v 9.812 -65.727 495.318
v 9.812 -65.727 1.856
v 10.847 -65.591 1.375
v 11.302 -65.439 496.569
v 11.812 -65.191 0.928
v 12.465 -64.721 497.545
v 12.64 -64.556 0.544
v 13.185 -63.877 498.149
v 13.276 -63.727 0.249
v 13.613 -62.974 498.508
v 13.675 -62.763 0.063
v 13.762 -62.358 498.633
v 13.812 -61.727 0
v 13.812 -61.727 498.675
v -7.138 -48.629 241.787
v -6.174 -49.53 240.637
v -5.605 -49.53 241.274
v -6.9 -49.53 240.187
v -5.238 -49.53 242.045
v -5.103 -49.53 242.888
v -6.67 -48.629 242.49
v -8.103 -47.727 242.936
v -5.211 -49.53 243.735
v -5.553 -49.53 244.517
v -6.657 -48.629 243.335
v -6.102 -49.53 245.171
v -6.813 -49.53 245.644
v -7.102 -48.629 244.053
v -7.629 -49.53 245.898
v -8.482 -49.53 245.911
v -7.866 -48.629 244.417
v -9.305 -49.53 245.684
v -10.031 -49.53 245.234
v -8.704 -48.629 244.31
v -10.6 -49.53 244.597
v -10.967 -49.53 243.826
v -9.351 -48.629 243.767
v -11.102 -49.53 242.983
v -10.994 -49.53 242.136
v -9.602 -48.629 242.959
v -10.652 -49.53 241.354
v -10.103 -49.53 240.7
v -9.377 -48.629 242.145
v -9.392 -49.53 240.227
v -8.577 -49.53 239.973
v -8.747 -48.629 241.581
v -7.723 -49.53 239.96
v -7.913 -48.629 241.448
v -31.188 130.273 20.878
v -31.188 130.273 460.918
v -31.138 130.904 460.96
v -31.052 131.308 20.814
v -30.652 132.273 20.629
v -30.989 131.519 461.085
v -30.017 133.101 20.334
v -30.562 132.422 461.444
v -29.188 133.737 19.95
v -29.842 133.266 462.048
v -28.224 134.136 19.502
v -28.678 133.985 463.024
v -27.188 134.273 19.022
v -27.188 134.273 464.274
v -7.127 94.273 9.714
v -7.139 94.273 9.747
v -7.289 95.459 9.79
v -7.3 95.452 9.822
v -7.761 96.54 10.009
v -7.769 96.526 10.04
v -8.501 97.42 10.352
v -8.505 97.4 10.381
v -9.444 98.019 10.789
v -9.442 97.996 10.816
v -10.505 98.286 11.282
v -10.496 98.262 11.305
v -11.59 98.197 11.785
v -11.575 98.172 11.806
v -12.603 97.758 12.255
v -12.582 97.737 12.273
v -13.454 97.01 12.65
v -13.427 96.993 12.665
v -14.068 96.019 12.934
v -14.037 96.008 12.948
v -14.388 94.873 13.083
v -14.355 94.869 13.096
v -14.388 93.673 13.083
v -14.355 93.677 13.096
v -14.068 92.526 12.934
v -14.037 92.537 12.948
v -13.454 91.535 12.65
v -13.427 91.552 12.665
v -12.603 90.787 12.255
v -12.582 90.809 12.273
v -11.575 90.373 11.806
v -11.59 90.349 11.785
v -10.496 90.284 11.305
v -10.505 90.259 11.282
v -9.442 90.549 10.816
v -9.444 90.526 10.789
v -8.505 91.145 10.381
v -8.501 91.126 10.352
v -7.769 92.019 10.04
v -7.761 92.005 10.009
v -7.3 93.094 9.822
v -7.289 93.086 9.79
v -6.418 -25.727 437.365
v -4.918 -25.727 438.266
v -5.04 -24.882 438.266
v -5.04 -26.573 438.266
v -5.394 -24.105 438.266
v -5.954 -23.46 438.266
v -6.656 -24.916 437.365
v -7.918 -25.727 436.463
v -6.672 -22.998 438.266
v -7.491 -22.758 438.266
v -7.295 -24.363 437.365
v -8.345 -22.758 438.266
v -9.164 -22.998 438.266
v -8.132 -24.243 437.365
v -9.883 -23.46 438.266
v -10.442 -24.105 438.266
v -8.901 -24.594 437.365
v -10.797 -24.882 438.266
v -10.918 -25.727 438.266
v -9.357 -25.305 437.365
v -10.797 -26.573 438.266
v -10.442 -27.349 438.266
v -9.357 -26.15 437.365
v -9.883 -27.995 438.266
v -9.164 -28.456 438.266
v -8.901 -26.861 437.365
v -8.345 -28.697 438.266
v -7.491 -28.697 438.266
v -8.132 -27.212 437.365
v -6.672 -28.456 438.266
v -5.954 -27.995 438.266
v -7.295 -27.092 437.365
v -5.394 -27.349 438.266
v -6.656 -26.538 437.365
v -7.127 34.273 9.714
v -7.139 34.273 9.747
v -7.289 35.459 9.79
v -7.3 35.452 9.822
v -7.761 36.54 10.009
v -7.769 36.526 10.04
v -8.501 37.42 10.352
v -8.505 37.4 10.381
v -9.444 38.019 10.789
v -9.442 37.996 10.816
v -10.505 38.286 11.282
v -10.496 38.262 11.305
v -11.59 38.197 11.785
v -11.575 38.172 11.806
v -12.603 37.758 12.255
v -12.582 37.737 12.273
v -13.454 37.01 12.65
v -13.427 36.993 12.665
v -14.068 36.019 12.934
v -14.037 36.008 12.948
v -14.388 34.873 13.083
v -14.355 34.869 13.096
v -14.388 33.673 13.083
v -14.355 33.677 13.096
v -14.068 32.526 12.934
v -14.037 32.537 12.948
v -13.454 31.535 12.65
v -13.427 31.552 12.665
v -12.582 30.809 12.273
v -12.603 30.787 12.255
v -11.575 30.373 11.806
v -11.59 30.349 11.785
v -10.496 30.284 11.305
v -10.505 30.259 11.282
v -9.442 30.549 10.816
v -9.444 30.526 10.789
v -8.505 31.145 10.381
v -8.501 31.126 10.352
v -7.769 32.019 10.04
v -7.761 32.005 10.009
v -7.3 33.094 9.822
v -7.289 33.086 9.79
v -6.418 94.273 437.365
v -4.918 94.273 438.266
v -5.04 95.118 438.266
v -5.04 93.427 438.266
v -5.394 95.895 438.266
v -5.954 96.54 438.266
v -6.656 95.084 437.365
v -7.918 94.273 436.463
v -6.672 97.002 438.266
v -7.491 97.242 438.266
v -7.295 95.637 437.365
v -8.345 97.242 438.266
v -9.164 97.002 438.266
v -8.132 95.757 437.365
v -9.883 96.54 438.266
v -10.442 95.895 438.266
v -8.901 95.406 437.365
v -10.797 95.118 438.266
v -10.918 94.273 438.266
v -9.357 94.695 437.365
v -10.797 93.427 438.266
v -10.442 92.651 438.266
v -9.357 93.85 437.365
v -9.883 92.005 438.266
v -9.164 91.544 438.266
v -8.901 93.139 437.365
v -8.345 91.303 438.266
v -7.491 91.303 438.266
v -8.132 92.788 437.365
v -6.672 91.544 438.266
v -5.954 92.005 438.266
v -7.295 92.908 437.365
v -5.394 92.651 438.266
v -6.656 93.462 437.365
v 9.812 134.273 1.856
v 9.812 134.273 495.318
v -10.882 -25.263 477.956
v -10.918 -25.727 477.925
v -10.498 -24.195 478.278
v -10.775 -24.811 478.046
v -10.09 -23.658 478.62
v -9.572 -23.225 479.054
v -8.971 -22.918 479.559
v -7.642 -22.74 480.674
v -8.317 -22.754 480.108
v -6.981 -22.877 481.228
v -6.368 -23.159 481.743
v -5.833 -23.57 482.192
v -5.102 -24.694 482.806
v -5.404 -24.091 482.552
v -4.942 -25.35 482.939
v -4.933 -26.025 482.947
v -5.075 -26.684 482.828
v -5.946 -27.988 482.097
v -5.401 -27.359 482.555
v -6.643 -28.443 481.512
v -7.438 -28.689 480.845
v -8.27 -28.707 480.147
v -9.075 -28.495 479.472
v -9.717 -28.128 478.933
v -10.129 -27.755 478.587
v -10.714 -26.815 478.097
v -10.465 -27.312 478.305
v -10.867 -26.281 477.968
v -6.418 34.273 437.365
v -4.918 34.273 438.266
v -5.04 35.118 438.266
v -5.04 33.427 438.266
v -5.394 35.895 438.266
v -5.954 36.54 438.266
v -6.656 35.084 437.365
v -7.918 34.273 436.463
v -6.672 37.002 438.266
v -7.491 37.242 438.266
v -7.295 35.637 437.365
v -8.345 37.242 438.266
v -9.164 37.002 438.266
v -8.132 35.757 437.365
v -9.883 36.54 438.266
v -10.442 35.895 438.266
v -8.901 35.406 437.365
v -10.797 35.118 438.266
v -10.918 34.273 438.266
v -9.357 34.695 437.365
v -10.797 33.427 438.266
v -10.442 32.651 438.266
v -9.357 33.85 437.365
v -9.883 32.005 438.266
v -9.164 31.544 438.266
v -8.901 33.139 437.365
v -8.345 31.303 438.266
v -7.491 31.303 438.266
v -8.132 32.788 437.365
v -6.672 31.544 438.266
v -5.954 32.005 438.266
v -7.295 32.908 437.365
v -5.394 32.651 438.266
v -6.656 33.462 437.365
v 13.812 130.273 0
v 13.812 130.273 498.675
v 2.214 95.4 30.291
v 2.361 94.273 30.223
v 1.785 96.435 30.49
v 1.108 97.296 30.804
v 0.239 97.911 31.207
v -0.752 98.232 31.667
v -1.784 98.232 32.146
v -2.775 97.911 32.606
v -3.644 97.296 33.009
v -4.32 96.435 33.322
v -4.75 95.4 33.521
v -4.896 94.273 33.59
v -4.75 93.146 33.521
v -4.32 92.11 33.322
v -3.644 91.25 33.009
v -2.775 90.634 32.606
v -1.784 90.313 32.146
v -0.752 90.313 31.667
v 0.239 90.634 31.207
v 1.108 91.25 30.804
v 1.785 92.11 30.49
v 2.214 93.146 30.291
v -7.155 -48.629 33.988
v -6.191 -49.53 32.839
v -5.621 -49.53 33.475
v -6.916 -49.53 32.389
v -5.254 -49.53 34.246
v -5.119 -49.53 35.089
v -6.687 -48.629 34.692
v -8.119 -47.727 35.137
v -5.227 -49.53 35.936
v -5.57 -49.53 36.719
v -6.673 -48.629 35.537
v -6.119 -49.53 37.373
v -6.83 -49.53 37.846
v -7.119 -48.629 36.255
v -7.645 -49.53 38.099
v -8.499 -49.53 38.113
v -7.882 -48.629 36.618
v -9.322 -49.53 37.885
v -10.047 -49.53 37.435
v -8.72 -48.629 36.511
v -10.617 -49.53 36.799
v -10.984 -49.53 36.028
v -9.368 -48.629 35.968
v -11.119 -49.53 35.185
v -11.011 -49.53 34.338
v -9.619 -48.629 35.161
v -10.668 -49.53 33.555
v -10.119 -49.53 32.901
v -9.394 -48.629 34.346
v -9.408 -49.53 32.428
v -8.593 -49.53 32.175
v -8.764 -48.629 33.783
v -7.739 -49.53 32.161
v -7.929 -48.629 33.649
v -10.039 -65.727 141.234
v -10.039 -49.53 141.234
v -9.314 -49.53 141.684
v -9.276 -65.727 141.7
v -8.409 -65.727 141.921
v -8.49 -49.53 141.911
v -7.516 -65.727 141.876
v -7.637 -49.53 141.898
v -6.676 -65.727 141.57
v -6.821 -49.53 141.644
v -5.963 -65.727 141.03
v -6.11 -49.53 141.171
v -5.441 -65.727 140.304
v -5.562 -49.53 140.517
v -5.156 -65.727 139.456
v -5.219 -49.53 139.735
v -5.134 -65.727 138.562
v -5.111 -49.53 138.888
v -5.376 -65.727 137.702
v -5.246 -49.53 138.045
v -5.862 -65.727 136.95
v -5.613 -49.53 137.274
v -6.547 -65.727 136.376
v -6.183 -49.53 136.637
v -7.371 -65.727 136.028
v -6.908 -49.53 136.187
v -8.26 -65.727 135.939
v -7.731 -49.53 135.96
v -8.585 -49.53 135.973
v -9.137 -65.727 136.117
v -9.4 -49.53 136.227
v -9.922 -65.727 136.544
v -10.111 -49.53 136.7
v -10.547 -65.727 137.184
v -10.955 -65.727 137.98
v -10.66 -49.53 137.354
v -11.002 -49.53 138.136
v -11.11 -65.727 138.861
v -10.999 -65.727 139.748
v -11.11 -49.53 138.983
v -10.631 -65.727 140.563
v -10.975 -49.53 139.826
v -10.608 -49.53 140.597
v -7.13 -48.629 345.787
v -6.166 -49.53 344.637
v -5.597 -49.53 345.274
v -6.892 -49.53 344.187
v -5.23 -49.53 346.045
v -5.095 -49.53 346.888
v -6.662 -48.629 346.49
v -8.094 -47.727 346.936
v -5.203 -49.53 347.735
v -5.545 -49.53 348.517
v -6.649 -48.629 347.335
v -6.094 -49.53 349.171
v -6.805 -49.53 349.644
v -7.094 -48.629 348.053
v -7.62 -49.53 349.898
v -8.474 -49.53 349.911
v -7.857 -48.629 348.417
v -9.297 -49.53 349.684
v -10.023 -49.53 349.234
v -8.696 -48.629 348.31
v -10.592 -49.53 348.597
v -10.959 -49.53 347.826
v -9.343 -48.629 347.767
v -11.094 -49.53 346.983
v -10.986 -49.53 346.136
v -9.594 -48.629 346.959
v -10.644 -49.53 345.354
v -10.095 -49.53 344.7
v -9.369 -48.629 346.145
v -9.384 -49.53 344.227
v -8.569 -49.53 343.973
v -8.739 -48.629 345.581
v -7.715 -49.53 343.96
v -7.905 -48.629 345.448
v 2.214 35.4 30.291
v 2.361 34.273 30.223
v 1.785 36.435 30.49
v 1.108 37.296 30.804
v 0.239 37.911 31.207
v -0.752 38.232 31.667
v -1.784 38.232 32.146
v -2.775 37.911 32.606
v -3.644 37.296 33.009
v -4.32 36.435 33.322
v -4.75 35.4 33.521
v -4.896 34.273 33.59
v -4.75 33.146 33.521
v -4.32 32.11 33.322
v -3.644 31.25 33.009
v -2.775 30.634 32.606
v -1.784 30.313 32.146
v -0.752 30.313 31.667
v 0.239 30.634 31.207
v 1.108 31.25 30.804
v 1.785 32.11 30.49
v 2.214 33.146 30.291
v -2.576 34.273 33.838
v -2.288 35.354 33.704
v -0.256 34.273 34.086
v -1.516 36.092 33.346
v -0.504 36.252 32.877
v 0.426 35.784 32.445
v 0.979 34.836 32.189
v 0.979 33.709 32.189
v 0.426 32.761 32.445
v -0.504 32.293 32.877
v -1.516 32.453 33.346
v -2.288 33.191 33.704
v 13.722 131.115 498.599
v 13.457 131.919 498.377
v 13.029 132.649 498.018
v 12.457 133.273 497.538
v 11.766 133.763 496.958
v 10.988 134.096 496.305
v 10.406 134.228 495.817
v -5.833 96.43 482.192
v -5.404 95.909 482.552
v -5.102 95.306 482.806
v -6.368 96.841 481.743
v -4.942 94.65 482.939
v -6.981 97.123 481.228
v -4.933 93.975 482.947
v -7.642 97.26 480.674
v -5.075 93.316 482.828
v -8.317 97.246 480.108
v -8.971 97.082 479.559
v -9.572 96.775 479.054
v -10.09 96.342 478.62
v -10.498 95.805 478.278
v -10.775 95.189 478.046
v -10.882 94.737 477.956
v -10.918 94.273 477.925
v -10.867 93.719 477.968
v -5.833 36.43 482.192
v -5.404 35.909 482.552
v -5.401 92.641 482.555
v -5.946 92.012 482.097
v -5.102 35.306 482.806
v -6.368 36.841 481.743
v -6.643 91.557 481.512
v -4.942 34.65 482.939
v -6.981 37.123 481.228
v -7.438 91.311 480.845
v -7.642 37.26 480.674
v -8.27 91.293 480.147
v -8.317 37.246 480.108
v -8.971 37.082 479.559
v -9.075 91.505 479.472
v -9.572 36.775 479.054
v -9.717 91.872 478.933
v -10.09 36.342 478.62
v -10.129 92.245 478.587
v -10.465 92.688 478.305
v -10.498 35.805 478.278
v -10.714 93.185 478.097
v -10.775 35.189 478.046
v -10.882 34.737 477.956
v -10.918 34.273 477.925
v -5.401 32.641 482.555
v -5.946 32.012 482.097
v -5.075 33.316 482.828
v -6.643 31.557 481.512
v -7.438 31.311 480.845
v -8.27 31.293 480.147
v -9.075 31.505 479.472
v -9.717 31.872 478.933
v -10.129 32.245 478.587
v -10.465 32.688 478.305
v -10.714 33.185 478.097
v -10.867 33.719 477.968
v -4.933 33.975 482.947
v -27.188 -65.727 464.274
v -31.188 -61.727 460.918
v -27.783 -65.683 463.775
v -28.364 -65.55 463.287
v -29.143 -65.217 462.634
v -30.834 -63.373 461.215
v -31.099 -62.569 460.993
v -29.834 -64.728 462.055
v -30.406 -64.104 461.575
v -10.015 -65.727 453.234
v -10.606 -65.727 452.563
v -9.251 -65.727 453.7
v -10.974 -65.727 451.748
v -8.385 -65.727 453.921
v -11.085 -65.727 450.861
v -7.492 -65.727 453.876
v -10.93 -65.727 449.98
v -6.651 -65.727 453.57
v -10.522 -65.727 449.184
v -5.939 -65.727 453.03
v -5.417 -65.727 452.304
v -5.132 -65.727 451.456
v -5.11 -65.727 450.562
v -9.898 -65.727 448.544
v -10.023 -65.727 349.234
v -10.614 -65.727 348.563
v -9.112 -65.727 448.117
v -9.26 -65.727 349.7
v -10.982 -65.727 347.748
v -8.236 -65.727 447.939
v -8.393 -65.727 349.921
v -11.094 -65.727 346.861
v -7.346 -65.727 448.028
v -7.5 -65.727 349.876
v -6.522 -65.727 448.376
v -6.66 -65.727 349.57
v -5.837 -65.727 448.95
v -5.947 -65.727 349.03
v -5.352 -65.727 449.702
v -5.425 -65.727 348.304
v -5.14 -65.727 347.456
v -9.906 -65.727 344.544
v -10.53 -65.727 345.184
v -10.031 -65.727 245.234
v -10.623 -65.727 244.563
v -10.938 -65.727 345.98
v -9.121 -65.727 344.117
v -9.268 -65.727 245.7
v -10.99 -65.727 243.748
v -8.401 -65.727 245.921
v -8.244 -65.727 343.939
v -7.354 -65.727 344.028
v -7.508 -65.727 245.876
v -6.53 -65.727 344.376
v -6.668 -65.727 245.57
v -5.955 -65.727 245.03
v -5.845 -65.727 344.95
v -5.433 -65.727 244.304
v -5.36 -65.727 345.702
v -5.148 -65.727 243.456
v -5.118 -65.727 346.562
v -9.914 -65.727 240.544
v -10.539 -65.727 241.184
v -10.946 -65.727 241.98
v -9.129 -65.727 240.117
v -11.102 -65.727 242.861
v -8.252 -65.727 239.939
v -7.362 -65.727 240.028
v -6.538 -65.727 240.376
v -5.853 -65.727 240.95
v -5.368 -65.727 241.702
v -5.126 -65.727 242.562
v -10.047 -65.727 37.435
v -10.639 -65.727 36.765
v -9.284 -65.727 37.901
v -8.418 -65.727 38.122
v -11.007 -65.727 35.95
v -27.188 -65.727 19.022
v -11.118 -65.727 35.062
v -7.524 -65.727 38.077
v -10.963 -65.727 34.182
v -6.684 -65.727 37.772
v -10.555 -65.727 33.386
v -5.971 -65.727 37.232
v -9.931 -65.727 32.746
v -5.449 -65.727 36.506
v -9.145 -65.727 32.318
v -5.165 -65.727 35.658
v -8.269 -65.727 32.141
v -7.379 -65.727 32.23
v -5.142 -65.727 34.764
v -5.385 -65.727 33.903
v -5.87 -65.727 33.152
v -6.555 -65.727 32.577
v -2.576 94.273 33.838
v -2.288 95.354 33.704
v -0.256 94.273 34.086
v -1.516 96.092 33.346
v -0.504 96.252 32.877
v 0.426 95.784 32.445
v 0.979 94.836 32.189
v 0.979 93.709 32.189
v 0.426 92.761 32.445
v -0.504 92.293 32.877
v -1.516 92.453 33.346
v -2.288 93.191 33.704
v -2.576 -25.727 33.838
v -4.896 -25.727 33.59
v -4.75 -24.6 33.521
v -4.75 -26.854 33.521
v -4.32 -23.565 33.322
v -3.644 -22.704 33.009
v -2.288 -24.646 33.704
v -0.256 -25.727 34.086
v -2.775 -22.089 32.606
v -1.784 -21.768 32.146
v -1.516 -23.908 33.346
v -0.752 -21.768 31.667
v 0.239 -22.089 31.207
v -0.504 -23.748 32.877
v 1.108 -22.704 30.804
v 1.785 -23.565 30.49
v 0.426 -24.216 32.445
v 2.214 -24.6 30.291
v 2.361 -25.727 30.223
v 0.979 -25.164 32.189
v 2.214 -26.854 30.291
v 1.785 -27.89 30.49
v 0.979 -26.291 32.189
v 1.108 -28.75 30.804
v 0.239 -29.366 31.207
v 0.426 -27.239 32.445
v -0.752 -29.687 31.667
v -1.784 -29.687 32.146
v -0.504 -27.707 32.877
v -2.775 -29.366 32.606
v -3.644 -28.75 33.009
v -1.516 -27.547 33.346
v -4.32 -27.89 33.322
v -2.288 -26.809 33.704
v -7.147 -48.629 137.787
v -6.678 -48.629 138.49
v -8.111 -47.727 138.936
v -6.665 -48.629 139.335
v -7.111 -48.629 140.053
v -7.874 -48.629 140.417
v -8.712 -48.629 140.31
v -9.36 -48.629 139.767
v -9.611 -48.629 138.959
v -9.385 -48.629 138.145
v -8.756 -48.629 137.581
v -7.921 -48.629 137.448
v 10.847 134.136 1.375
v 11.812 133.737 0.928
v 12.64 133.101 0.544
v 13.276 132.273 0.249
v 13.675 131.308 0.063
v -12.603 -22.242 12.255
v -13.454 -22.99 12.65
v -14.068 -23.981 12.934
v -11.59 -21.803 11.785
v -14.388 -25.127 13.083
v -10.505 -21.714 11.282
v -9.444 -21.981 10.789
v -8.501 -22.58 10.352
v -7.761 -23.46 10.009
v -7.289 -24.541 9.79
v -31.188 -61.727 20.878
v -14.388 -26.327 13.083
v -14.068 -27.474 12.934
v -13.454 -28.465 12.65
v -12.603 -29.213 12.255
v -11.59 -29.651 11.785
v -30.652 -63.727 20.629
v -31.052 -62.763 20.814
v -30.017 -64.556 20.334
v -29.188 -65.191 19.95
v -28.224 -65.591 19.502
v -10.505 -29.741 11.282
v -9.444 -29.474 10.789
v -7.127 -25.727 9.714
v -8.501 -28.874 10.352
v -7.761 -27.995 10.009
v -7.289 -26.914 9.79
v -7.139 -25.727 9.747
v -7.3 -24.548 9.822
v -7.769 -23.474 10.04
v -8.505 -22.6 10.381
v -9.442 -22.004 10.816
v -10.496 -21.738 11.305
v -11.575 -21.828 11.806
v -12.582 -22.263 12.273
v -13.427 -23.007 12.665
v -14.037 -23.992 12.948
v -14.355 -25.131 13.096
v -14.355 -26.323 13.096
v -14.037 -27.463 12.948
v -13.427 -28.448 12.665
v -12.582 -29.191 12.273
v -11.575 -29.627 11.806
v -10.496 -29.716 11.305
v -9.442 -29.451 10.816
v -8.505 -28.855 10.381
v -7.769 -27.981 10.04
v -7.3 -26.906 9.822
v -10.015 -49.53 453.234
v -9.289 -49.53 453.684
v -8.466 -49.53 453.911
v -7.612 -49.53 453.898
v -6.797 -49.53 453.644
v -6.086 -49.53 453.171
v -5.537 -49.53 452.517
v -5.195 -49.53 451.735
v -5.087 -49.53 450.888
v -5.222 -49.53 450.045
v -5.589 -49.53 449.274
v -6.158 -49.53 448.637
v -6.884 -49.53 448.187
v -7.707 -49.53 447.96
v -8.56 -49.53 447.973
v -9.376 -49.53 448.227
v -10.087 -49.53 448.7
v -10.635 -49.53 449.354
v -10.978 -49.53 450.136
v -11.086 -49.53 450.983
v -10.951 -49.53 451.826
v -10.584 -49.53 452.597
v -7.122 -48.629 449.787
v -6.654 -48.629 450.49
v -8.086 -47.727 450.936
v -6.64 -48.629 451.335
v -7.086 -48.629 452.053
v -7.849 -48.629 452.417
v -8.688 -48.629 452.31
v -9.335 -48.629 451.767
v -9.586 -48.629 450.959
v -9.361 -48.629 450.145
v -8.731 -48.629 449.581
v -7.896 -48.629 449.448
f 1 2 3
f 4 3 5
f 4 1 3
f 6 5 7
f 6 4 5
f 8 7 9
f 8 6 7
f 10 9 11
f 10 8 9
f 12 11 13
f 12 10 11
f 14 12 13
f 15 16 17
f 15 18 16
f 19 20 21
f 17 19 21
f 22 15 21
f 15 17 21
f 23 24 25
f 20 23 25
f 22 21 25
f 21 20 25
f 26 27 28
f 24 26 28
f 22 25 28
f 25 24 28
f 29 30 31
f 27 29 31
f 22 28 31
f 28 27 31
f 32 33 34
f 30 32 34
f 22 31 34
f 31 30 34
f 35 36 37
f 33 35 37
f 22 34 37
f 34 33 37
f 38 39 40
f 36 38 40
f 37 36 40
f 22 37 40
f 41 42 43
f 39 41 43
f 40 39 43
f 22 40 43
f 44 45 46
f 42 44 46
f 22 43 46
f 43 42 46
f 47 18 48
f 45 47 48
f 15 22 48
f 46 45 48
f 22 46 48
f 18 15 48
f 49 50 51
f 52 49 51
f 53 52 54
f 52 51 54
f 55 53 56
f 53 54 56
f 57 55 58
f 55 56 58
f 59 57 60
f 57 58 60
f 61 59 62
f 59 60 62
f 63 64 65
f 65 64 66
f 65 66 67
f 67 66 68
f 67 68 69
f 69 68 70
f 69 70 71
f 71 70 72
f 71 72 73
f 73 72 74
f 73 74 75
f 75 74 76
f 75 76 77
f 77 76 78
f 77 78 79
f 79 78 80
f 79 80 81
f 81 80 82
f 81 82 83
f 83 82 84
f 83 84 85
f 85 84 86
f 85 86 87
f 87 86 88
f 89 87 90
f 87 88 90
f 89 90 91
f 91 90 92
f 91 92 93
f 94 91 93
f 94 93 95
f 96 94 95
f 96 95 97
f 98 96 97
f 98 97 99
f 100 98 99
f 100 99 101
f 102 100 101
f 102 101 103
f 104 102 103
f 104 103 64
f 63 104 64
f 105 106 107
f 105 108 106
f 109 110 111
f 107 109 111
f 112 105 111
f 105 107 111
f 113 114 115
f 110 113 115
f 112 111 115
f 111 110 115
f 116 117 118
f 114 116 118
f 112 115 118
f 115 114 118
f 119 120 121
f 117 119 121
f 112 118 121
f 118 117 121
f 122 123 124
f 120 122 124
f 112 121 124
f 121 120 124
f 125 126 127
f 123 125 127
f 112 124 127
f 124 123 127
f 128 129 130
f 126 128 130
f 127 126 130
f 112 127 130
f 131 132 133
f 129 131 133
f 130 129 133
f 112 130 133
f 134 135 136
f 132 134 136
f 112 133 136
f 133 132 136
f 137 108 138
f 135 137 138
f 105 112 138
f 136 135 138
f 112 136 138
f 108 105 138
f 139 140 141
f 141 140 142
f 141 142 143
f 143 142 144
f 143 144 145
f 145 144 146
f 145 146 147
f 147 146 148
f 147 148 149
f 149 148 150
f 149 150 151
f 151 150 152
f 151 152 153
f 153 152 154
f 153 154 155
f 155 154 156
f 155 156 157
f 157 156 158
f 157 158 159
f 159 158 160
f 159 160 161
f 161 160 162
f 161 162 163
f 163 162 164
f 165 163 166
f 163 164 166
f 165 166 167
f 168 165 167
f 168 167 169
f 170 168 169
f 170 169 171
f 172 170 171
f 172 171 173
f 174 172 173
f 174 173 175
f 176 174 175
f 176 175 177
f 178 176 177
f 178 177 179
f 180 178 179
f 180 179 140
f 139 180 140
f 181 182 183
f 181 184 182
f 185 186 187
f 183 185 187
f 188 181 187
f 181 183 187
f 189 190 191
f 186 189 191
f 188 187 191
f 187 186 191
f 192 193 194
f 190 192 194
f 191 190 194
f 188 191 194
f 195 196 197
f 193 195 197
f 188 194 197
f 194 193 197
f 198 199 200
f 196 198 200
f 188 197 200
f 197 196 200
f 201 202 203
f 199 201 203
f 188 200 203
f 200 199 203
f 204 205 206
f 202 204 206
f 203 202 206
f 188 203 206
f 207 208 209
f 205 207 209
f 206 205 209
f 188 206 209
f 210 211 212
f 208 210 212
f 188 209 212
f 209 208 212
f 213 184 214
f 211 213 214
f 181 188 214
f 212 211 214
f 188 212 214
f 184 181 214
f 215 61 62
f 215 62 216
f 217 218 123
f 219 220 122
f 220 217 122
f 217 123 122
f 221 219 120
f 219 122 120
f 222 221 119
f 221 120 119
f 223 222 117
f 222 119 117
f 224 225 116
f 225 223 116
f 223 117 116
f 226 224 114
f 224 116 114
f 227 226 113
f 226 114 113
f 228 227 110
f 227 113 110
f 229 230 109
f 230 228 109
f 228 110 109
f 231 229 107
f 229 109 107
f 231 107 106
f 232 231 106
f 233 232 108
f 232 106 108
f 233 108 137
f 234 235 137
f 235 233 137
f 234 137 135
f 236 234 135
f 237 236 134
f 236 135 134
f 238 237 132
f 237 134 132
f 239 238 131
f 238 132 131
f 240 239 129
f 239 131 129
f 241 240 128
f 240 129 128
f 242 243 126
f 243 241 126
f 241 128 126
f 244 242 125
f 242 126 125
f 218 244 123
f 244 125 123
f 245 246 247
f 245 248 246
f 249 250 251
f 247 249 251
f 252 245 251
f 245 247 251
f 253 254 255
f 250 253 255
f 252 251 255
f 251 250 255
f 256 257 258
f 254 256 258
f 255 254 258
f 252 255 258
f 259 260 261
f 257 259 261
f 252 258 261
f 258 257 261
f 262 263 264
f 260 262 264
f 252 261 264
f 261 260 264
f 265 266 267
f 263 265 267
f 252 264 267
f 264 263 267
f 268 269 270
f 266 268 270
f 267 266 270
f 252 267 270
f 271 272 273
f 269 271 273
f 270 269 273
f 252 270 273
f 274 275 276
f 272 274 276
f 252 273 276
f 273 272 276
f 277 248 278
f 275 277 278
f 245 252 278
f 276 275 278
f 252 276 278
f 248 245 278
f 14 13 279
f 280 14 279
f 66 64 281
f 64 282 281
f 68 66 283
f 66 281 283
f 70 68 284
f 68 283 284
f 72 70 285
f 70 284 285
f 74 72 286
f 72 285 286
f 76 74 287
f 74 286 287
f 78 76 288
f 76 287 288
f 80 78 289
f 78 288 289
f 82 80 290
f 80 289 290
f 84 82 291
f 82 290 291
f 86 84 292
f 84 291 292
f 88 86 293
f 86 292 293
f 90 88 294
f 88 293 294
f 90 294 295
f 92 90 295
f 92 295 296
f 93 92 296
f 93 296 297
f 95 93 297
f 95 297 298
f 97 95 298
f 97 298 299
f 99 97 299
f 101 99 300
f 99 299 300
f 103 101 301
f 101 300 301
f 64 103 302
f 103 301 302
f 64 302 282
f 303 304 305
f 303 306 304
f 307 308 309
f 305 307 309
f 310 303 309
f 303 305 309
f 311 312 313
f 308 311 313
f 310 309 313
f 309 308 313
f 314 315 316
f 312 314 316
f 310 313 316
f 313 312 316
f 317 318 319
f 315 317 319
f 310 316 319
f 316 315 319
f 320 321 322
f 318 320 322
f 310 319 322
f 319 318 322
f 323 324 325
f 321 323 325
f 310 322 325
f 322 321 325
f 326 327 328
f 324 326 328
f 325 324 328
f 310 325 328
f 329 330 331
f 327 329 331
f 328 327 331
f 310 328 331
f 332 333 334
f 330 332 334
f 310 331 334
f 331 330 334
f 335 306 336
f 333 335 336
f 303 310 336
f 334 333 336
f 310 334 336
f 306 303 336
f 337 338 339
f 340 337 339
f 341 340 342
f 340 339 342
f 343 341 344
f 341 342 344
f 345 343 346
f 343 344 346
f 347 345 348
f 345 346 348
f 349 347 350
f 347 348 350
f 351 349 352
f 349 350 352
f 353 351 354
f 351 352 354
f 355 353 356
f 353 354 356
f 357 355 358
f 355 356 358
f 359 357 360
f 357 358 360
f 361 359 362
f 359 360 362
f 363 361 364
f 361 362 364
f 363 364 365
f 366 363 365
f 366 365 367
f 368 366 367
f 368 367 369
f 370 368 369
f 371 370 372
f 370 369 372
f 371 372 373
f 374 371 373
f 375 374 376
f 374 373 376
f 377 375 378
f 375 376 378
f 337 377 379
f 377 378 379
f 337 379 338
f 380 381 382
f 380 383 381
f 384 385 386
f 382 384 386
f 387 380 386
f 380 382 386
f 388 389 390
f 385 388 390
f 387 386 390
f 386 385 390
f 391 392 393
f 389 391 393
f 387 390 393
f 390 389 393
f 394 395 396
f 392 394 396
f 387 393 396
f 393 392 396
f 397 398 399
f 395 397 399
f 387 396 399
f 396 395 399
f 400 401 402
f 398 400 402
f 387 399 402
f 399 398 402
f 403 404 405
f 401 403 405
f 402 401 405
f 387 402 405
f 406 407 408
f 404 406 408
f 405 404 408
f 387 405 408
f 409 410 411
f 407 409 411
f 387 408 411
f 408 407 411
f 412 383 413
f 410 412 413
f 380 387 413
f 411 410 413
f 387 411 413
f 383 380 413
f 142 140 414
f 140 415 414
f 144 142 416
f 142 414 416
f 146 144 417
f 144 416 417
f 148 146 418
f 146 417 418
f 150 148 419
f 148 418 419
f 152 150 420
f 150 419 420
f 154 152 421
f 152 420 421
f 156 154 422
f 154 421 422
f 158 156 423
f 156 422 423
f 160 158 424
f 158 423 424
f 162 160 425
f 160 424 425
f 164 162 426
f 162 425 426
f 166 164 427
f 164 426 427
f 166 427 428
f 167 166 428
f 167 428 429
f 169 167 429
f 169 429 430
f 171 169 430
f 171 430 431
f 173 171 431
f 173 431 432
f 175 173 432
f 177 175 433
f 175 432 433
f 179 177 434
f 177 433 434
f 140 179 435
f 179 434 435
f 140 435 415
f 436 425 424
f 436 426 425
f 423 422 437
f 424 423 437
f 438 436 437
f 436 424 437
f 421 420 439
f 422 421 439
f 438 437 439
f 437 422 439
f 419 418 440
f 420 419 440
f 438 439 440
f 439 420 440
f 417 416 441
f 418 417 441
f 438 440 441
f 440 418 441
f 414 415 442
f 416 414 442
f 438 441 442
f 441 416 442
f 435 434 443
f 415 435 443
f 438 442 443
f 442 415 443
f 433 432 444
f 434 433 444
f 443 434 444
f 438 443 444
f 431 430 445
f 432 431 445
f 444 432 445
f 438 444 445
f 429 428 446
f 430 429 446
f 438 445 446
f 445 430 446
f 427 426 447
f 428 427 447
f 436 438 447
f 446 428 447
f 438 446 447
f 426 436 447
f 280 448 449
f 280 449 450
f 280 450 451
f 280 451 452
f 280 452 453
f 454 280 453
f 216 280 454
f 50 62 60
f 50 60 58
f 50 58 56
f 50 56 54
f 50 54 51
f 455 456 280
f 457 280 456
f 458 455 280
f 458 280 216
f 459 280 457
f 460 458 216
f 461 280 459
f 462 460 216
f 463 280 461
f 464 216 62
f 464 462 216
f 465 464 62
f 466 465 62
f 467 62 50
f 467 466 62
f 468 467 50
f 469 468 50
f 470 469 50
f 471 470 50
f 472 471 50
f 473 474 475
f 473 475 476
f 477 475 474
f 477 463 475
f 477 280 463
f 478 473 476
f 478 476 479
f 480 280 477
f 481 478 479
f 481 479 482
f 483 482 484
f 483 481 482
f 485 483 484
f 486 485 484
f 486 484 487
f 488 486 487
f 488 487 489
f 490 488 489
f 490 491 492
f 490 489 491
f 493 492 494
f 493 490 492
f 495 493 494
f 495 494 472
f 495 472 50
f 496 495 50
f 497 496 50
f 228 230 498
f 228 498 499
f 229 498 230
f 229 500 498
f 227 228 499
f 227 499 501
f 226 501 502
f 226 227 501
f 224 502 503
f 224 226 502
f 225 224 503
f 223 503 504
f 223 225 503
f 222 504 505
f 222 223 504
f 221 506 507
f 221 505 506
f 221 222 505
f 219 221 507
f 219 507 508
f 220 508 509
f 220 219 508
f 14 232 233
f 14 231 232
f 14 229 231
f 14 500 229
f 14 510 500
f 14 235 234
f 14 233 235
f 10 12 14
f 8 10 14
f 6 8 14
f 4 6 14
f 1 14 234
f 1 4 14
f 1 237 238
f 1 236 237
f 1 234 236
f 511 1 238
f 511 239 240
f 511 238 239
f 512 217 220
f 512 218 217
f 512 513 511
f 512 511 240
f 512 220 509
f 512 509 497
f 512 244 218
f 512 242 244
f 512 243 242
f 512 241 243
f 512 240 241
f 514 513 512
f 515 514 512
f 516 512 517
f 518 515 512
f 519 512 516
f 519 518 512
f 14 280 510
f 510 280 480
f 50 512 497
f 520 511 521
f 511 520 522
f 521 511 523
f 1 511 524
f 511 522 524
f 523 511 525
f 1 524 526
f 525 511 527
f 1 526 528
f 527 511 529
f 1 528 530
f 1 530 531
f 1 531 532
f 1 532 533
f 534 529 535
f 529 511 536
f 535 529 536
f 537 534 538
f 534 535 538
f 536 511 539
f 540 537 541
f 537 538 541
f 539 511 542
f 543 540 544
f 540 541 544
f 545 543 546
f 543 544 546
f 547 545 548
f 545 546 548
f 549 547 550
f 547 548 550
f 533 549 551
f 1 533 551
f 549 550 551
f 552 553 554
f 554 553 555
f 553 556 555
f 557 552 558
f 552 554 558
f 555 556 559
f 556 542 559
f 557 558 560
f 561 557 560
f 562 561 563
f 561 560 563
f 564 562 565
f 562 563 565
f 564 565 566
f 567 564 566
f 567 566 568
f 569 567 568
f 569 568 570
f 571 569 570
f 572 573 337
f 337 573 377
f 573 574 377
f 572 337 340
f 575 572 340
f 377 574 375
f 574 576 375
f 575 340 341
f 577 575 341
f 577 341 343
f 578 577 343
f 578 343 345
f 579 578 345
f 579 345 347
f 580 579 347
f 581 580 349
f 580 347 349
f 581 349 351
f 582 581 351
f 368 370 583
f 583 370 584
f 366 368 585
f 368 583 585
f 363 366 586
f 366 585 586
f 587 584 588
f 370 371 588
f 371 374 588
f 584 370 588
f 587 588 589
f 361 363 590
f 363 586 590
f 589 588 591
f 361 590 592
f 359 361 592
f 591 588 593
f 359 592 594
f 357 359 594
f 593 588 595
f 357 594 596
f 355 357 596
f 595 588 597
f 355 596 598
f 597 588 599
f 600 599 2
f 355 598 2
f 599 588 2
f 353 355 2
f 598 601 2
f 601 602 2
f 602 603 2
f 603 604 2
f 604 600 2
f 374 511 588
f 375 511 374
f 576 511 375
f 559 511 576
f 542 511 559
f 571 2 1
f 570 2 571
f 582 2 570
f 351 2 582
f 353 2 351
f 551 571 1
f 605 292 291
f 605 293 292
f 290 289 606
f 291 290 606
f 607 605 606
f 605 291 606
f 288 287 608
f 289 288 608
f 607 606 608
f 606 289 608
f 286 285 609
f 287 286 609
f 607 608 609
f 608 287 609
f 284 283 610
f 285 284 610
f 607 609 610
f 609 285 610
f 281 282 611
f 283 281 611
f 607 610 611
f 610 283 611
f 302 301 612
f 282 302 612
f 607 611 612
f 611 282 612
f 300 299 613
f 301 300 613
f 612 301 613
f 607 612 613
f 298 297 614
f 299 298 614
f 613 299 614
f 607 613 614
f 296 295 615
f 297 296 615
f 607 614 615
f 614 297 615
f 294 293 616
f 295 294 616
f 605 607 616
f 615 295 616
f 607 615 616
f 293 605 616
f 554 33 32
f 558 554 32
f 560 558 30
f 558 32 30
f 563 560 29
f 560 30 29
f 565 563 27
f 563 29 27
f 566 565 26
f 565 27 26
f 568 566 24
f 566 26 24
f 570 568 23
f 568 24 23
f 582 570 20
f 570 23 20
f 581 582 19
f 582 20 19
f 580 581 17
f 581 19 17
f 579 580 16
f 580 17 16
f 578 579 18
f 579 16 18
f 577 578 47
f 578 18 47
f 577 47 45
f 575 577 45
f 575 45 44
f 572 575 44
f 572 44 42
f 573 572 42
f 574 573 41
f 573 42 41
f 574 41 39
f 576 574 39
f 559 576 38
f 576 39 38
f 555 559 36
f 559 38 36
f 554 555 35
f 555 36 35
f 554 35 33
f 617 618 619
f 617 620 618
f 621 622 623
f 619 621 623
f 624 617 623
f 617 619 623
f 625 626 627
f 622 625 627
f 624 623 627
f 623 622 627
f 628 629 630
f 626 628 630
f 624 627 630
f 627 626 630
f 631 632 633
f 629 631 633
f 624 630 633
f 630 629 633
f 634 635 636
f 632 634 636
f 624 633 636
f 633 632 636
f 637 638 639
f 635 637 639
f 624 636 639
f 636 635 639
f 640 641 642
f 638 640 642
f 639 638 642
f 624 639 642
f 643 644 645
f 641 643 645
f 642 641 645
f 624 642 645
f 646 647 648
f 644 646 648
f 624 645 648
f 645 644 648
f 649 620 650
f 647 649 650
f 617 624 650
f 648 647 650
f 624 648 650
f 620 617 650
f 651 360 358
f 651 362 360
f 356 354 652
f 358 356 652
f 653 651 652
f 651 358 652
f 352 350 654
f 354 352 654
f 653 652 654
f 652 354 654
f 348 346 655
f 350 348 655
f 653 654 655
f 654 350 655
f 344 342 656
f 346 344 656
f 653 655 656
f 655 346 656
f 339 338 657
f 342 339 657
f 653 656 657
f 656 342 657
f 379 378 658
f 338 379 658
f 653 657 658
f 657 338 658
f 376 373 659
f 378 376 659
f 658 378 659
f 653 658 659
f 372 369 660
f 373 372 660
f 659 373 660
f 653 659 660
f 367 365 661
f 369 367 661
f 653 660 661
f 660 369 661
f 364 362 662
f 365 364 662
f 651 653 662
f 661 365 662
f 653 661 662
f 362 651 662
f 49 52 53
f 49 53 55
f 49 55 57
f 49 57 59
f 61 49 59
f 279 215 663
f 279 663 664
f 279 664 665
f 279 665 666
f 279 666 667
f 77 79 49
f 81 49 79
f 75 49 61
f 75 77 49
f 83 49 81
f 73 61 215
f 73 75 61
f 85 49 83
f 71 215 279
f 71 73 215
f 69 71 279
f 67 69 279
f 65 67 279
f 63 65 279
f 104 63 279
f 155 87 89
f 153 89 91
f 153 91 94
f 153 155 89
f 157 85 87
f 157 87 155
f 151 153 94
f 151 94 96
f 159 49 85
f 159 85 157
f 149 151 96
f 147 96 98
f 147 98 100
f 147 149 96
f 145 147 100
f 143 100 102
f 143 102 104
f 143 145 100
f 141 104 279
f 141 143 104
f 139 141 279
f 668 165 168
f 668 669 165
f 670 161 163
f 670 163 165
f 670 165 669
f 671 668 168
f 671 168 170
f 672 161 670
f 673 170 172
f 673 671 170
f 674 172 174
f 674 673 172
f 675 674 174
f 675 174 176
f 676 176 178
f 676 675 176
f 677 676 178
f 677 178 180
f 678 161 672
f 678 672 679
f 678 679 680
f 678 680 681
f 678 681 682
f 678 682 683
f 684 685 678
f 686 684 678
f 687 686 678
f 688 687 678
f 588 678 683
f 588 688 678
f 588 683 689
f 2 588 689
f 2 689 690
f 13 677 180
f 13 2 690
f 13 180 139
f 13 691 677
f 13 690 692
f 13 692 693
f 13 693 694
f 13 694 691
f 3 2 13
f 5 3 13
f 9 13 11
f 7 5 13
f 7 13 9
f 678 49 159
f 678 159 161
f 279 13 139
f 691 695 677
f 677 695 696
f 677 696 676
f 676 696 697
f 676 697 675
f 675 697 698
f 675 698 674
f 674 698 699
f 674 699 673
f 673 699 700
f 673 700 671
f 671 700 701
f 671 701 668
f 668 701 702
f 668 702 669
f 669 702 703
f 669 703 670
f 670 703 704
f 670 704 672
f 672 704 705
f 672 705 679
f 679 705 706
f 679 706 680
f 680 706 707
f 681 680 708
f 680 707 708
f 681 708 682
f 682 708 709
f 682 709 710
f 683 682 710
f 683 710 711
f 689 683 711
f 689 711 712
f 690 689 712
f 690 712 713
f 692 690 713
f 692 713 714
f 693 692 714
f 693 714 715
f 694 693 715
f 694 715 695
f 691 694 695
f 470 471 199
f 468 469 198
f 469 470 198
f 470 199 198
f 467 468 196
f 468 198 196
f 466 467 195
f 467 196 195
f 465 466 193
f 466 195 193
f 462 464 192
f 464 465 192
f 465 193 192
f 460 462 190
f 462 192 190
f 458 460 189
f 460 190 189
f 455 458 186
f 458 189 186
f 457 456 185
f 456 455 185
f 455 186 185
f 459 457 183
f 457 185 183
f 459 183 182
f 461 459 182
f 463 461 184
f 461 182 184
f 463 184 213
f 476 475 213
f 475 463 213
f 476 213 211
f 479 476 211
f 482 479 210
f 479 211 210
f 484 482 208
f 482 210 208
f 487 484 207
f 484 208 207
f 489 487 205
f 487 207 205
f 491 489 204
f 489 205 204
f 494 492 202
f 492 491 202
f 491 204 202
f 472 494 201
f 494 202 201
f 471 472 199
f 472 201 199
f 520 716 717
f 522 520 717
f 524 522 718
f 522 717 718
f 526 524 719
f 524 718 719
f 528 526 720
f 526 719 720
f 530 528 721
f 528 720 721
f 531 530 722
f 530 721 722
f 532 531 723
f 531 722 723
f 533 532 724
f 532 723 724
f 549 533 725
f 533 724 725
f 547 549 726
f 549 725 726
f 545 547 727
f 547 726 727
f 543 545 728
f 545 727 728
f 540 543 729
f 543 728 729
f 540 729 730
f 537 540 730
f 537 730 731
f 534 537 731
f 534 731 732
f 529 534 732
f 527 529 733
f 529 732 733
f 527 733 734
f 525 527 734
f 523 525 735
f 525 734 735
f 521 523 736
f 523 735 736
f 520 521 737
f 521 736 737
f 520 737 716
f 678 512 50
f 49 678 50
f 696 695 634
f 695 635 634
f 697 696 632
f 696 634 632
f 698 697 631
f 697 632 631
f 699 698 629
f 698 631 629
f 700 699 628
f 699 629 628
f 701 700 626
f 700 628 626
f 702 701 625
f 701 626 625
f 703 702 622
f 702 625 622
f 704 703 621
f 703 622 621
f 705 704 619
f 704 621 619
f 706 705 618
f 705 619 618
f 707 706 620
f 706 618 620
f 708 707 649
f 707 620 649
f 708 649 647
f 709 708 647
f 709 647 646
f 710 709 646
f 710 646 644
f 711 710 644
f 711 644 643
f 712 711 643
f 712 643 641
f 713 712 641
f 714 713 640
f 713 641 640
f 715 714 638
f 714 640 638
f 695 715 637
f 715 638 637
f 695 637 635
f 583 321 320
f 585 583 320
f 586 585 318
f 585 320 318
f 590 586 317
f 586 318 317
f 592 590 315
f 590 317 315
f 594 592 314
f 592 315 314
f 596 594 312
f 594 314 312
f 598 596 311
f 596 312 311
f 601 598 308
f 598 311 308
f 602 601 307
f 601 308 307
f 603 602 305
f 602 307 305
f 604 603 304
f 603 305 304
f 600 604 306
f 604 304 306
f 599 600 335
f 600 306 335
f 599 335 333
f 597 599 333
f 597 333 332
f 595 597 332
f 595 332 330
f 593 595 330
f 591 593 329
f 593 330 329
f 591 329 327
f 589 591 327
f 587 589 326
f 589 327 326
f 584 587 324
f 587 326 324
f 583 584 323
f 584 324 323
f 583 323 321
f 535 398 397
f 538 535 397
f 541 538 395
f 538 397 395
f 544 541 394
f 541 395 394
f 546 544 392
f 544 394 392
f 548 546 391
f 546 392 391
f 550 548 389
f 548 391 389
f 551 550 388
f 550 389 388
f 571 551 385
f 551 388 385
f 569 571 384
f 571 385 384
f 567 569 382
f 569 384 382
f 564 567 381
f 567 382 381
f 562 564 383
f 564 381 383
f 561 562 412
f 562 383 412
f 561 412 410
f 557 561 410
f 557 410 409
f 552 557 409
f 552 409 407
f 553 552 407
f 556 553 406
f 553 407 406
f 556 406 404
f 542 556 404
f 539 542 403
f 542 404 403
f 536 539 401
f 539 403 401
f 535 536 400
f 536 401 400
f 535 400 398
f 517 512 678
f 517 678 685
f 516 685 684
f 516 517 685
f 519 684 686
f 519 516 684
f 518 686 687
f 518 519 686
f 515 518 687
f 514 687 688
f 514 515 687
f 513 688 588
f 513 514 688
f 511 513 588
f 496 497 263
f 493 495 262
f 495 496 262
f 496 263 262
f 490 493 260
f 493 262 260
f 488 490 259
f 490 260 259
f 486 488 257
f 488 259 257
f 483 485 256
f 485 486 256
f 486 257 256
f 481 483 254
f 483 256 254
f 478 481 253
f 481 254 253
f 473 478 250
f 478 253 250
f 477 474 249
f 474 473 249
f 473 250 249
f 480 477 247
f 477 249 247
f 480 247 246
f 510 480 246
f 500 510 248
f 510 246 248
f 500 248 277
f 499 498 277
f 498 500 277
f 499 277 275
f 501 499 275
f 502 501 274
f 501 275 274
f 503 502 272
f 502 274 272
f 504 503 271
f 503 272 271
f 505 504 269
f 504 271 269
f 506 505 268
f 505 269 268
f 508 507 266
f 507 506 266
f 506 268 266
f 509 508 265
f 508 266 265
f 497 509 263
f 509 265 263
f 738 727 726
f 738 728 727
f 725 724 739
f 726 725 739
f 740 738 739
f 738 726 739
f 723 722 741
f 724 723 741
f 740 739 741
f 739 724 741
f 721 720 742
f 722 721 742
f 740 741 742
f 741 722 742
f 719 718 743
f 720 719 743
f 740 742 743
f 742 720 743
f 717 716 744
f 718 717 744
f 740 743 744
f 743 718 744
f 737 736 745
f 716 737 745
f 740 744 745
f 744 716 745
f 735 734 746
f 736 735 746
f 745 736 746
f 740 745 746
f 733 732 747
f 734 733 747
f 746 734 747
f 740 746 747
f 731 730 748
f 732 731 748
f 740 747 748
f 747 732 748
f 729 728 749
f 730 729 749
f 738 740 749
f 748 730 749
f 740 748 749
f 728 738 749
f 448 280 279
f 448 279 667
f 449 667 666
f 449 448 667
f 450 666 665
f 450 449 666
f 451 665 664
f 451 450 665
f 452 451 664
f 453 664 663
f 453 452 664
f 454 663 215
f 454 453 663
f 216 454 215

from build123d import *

# Parameters (mm, degrees)
SKETCH1_W                        = 45
SKETCH1_H                        = 200
BOSS_EXTRUDE1_DEPTH              = 510
FILLET1_R                        = 4
CUT_EXTRUDE1_DEPTH               = 549.700926986
CUT_EXTRUDE1_DEPTH_BACK          = 549.700926986
CUT_EXTRUDE2_DEPTH               = 539.19055733
CUT_EXTRUDE2_DEPTH_BACK          = 539.19055733
F_8_0MM_DOWEL_SLOT1_D            = 8
F_8_0MM_DOWEL_SLOT1_DEPTH        = 22.596557524
F_8_0MM_DOWEL_SLOT1_CSINK_D      = 8.05
F_8_0MM_DOWEL_SLOT1_CSINK_ANGLE  = 90
F_8_0MM_DOWEL_SLOT1_TIP          = 2.403442476
F_6_0MM_DOWEL_SLOT_D             = 6
F_6_0MM_DOWEL_SLOT_DEPTH         = 128.197418143
F_6_0MM_DOWEL_SLOT_CSINK_D       = 6.05
F_6_0MM_DOWEL_SLOT_CSINK_ANGLE   = 90
F_6_0MM_DOWEL_SLOT_TIP           = 1.802581857
F_6_0MM_DOWEL_SLOT4_D            = 6
F_6_0MM_DOWEL_SLOT4_DEPTH        = 10.197418143
F_6_0MM_DOWEL_SLOT4_TIP          = 1.802581857
F_6_0MM_DOWEL_SLOT17_D           = 6
F_6_0MM_DOWEL_SLOT17_DEPTH       = 28.197418143
F_6_0MM_DOWEL_SLOT17_CSINK_D     = 6.05
F_6_0MM_DOWEL_SLOT17_CSINK_ANGLE = 90
F_6_0MM_DOWEL_SLOT17_TIP         = 1.802581857


with BuildPart() as part:
    # Sketch1 → Boss-Extrude1 (new body)
    with BuildSketch(Plane.XY):
        with Locations((-8.688255411, 34.272684877)):
            Rectangle(SKETCH1_W, SKETCH1_H)
    extrude(amount=BOSS_EXTRUDE1_DEPTH)

    # Fillet1
    fillet1_edges = [part.edges().sort_by_distance(p)[0] for p in [
        (13.811744589, 134.272684877, 255),
        (13.811744589, -65.727315123, 255),
        (-31.188255411, -65.727315123, 255),
        (-31.188255411, 134.272684877, 255),
    ]]
    fillet(fillet1_edges, radius=FILLET1_R)

    # Sketch2 → Cut-Extrude1 (cut, two sides: drawn at the far end of the back side and taken through both)
    with BuildSketch(Plane(origin=(0, 134.272684877, 0), x_dir=(1, 0, 0), z_dir=(0, 1, 0)).offset(-CUT_EXTRUDE1_DEPTH_BACK)):
        Polygon((788.614470133, -1148.76248804), (13.811744589, -498.67461207), (-31.188255411, -460.917963243), (-805.990980955, 189.169912727), (-2106.166732895, -1360.435538361), (-511.561281807, -2698.367939128), align=None)
    extrude(amount=CUT_EXTRUDE1_DEPTH + CUT_EXTRUDE1_DEPTH_BACK, mode=Mode.SUBTRACT)

    # Sketch3 → Cut-Extrude2 (cut, two sides: drawn at the far end of the back side and taken through both)
    with BuildSketch(Plane(origin=(0, 134.272684877, 0), x_dir=(1, 0, 0), z_dir=(0, 1, 0)).offset(-CUT_EXTRUDE2_DEPTH_BACK)):
        Polygon((-948.658060529, -446.533100004), (-31.188255411, -20.877527163), (13.811744589, 0), (931.281549707, 425.655572841), (79.970404025, 2260.595183077), (-1799.969206211, 1388.406510232), align=None)
    extrude(amount=CUT_EXTRUDE2_DEPTH + CUT_EXTRUDE2_DEPTH_BACK, mode=Mode.SUBTRACT)

    # Ø8.0mm Dowel Slot1
    with Locations(Plane(origin=(-1225.746798414, -65.727315123, 575.087047823), x_dir=(-0.9071269657115731, 0, 0.4208570637151221), z_dir=(-0.4208570637151221, 0, -0.9071269657115731))):
        with Locations((-1339.359258027, 40), (-1339.359258027, 100), (-1339.359258027, 160)):
            CounterSinkHole(F_8_0MM_DOWEL_SLOT1_D / 2, F_8_0MM_DOWEL_SLOT1_CSINK_D / 2, depth=F_8_0MM_DOWEL_SLOT1_DEPTH, counter_sink_angle=F_8_0MM_DOWEL_SLOT1_CSINK_ANGLE)
            with Locations((0, 0, -(F_8_0MM_DOWEL_SLOT1_DEPTH + F_8_0MM_DOWEL_SLOT1_TIP / 2))):  # 118° drill point
                Cone(0, F_8_0MM_DOWEL_SLOT1_D / 2, F_8_0MM_DOWEL_SLOT1_TIP, mode=Mode.SUBTRACT)

    # Ø6.0mm Dowel Slot
    with Locations(Plane(origin=(-1255.768167205, -65.727315123, 566.463420302), x_dir=(1, 0, 0), z_dir=(0, 0, 1))):
        with Locations((1247.849951753, 160), (1247.849951753, 100), (1247.849951753, 40)):
            CounterSinkHole(F_6_0MM_DOWEL_SLOT_D / 2, F_6_0MM_DOWEL_SLOT_CSINK_D / 2, depth=F_6_0MM_DOWEL_SLOT_DEPTH, counter_sink_angle=F_6_0MM_DOWEL_SLOT_CSINK_ANGLE)
            with Locations((0, 0, -(F_6_0MM_DOWEL_SLOT_DEPTH + F_6_0MM_DOWEL_SLOT_TIP / 2))):  # 118° drill point
                Cone(0, F_6_0MM_DOWEL_SLOT_D / 2, F_6_0MM_DOWEL_SLOT_TIP, mode=Mode.SUBTRACT)

    # Ø6.0mm Dowel Slot4
    with Locations(Plane(origin=(-1324.714305528, -77.727315123, 452.529822169), x_dir=(0.642759292005894, 0, -0.766068203582476), z_dir=(0, -1, 0))):
        with Locations((-341.005231297, 740.318686522), (-261.339405676, 807.171930483), (-181.750714685, 873.960445306), (-102.007754434, 940.878418405), (-22.496198074, 1007.60220409), (847.496198074, 1007.60220409), (927.007754434, 940.878418405), (1006.750714685, 873.960445306), (1086.339405676, 807.171930483), (1166.005231297, 740.318686522)):
            Hole(F_6_0MM_DOWEL_SLOT4_D / 2, depth=F_6_0MM_DOWEL_SLOT4_DEPTH)
            with Locations((0, 0, -(F_6_0MM_DOWEL_SLOT4_DEPTH + F_6_0MM_DOWEL_SLOT4_TIP / 2))):  # 118° drill point
                Cone(0, F_6_0MM_DOWEL_SLOT4_D / 2, F_6_0MM_DOWEL_SLOT4_TIP, mode=Mode.SUBTRACT)

    # Ø6.0mm Dowel Slot17
    with Locations(Plane(origin=(-1324.714305529, -77.727315123, 452.529822169), x_dir=(0.642759292005894, 0, -0.766068203582476), z_dir=(0, -1, 0))):
        with Locations((22.5, 1726.5), (22.5, 1640.5), (802.5, 1726.5), (802.5, 1640.5), (22.5, -955.960621131), (22.5, -1636.5), (802.5, -1462.5), (802.5, -1636.5), (22.5, -1722.5), (802.5, -1722.5), (22.5, -1550.5), (802.5, -640.31), (120, -1722.5), (217.5, -1722.5), (315, -1722.5), (412.5, -1722.5), (510, -1722.5), (607.5, -1722.5), (705, -1722.5), (22.5, -861.25), (22.5, -883.75), (-22.496198074, -917.60220409), (802.5, -861.25), (802.5, -883.75), (847.496198074, -917.60220409), (802.5, -529.84), (22.5, -750.249617159), (-341.005231297, -650.318686522), (1166.005231297, -650.318686522), (-310.084924074, 22.5), (-310.084924074, 67.5), (22.5, 67.5), (22.5, 22.5), (802.5, 67.5), (802.5, 22.5), (1133.730020848, 67.5), (1133.730020848, 22.5), (1166.005231297, 740.318686522), (802.560751791, 973.75), (802.560751791, 951.25), (847.496198074, 1007.60220409), (-22.496198074, 1007.60220409), (22.560751791, 951.25), (-341.005231297, 740.318686522), (22.5, 1812.5), (802.5, 1812.5), (22.5, 1552.5), (802.5, 1552.5), (-102.162023695, -850.748960129), (-181.827849315, -783.895716167), (-261.493674936, -717.042472206), (927.162023695, -850.748960129), (1006.827849315, -783.895716167), (1086.493674936, -717.042472206), (1086.493674936, 807.042472206), (1006.827849315, 873.895716167), (927.162023695, 940.748960129), (-102.162023695, 940.748960129), (-181.827849315, 873.895716167), (-261.493674936, 807.042472206), (-199.224924074, 67.5), (-88.364924074, 67.5), (-199.224924074, 22.5), (-88.364924074, 22.5), (912.010020848, 67.5), (1022.870020848, 67.5), (912.010020848, 22.5), (1022.870020848, 22.5), (120, 67.5), (217.5, 67.5), (315, 67.5), (607.5, 67.5), (705, 67.5), (510, 67.5), (120, 22.5), (217.5, 22.5), (315, 22.5), (510, 22.5), (607.5, 22.5), (705, 22.5), (412.5, 22.5), (22.5, -750.78), (22.5, -640.31), (22.5, -529.84), (22.5, -419.37), (22.5, -308.9), (22.5, -198.43), (22.5, -87.96), (802.5, -750.78), (802.5, -419.37), (802.5, -308.9), (802.5, -198.43), (22.5, 177.97), (22.5, 288.44), (22.5, 398.91), (22.5, 509.38), (22.5, 619.85), (22.5, 730.32), (22.5, 840.79), (802.5, -87.96), (802.5, 177.97), (802.5, 288.44), (120.000330201, 1812.753749877), (217.5, 1812.5), (315, 1812.5), (412.5, 1812.5), (510, 1812.5), (607.5, 1812.5), (705, 1812.5), (120.060751791, 951.25), (217.560751791, 951.25), (315.060751791, 951.25), (412.560751791, 951.25), (510.060751791, 951.25), (607.560751791, 951.25), (705.060751791, 951.25), (656.310751791, 973.75), (558.810751791, 973.75), (461.310751791, 973.75), (363.810751791, 973.75), (266.310751791, 973.75), (168.810751791, 973.75), (120, -861.25), (217.5, -861.25), (315, -861.25), (412.5, -861.25), (510, -861.25), (607.5, -861.25), (705, -861.25), (656.25, -883.75), (558.75, -883.75), (461.25, -883.75), (168.75, -883.75), (266.25, -883.75), (363.75, -883.75), (802.560751791, -955.960621131), (412.5, 67.5), (802.5, 730.32), (802.560751791, 840.79), (802.5, 398.91), (802.5, 509.38), (802.5, 619.85), (-360.000025903, 699.425529794), (-360.000025903, -609.521258848), (-360.000025903, 598.725529794), (-360.000025903, 498.025529794), (-360.000025903, 397.325529794), (-360.000025903, 296.625529794), (-360.000025903, 195.925529794), (-360.000025903, 95.225529794), (-360.000025903, -5.474470206), (-360.000025903, -106.174470206), (-360.000025903, -206.874470206), (-360.000025903, -307.574470206), (-360.000025903, -408.274470206), (-360.000025903, -508.974470206), (1185.00101945, 699.425529452), (1185.000941829, 598.725529794), (1185.000864209, 498.025529794), (1185.000708968, 296.625529794), (1185.000631348, 195.925529794), (1185.000553727, 95.225529794), (1185.000476107, -5.474470206), (1185.000398486, -106.174470206), (1185.000320866, -206.874470206), (1185.000165625, -408.274470206), (1185.000088004, -508.974470206), (1185.000786589, 397.325529794), (22.560751791, 1016.385842825), (802.560751791, 1016.385842825), (802.560751791, -1550.5), (22.560751791, 973.75), (802.560751791, -363.966698641)):
            CounterSinkHole(F_6_0MM_DOWEL_SLOT17_D / 2, F_6_0MM_DOWEL_SLOT17_CSINK_D / 2, depth=F_6_0MM_DOWEL_SLOT17_DEPTH, counter_sink_angle=F_6_0MM_DOWEL_SLOT17_CSINK_ANGLE)
            with Locations((0, 0, -(F_6_0MM_DOWEL_SLOT17_DEPTH + F_6_0MM_DOWEL_SLOT17_TIP / 2))):  # 118° drill point
                Cone(0, F_6_0MM_DOWEL_SLOT17_D / 2, F_6_0MM_DOWEL_SLOT17_TIP, mode=Mode.SUBTRACT)


solid = part.part
